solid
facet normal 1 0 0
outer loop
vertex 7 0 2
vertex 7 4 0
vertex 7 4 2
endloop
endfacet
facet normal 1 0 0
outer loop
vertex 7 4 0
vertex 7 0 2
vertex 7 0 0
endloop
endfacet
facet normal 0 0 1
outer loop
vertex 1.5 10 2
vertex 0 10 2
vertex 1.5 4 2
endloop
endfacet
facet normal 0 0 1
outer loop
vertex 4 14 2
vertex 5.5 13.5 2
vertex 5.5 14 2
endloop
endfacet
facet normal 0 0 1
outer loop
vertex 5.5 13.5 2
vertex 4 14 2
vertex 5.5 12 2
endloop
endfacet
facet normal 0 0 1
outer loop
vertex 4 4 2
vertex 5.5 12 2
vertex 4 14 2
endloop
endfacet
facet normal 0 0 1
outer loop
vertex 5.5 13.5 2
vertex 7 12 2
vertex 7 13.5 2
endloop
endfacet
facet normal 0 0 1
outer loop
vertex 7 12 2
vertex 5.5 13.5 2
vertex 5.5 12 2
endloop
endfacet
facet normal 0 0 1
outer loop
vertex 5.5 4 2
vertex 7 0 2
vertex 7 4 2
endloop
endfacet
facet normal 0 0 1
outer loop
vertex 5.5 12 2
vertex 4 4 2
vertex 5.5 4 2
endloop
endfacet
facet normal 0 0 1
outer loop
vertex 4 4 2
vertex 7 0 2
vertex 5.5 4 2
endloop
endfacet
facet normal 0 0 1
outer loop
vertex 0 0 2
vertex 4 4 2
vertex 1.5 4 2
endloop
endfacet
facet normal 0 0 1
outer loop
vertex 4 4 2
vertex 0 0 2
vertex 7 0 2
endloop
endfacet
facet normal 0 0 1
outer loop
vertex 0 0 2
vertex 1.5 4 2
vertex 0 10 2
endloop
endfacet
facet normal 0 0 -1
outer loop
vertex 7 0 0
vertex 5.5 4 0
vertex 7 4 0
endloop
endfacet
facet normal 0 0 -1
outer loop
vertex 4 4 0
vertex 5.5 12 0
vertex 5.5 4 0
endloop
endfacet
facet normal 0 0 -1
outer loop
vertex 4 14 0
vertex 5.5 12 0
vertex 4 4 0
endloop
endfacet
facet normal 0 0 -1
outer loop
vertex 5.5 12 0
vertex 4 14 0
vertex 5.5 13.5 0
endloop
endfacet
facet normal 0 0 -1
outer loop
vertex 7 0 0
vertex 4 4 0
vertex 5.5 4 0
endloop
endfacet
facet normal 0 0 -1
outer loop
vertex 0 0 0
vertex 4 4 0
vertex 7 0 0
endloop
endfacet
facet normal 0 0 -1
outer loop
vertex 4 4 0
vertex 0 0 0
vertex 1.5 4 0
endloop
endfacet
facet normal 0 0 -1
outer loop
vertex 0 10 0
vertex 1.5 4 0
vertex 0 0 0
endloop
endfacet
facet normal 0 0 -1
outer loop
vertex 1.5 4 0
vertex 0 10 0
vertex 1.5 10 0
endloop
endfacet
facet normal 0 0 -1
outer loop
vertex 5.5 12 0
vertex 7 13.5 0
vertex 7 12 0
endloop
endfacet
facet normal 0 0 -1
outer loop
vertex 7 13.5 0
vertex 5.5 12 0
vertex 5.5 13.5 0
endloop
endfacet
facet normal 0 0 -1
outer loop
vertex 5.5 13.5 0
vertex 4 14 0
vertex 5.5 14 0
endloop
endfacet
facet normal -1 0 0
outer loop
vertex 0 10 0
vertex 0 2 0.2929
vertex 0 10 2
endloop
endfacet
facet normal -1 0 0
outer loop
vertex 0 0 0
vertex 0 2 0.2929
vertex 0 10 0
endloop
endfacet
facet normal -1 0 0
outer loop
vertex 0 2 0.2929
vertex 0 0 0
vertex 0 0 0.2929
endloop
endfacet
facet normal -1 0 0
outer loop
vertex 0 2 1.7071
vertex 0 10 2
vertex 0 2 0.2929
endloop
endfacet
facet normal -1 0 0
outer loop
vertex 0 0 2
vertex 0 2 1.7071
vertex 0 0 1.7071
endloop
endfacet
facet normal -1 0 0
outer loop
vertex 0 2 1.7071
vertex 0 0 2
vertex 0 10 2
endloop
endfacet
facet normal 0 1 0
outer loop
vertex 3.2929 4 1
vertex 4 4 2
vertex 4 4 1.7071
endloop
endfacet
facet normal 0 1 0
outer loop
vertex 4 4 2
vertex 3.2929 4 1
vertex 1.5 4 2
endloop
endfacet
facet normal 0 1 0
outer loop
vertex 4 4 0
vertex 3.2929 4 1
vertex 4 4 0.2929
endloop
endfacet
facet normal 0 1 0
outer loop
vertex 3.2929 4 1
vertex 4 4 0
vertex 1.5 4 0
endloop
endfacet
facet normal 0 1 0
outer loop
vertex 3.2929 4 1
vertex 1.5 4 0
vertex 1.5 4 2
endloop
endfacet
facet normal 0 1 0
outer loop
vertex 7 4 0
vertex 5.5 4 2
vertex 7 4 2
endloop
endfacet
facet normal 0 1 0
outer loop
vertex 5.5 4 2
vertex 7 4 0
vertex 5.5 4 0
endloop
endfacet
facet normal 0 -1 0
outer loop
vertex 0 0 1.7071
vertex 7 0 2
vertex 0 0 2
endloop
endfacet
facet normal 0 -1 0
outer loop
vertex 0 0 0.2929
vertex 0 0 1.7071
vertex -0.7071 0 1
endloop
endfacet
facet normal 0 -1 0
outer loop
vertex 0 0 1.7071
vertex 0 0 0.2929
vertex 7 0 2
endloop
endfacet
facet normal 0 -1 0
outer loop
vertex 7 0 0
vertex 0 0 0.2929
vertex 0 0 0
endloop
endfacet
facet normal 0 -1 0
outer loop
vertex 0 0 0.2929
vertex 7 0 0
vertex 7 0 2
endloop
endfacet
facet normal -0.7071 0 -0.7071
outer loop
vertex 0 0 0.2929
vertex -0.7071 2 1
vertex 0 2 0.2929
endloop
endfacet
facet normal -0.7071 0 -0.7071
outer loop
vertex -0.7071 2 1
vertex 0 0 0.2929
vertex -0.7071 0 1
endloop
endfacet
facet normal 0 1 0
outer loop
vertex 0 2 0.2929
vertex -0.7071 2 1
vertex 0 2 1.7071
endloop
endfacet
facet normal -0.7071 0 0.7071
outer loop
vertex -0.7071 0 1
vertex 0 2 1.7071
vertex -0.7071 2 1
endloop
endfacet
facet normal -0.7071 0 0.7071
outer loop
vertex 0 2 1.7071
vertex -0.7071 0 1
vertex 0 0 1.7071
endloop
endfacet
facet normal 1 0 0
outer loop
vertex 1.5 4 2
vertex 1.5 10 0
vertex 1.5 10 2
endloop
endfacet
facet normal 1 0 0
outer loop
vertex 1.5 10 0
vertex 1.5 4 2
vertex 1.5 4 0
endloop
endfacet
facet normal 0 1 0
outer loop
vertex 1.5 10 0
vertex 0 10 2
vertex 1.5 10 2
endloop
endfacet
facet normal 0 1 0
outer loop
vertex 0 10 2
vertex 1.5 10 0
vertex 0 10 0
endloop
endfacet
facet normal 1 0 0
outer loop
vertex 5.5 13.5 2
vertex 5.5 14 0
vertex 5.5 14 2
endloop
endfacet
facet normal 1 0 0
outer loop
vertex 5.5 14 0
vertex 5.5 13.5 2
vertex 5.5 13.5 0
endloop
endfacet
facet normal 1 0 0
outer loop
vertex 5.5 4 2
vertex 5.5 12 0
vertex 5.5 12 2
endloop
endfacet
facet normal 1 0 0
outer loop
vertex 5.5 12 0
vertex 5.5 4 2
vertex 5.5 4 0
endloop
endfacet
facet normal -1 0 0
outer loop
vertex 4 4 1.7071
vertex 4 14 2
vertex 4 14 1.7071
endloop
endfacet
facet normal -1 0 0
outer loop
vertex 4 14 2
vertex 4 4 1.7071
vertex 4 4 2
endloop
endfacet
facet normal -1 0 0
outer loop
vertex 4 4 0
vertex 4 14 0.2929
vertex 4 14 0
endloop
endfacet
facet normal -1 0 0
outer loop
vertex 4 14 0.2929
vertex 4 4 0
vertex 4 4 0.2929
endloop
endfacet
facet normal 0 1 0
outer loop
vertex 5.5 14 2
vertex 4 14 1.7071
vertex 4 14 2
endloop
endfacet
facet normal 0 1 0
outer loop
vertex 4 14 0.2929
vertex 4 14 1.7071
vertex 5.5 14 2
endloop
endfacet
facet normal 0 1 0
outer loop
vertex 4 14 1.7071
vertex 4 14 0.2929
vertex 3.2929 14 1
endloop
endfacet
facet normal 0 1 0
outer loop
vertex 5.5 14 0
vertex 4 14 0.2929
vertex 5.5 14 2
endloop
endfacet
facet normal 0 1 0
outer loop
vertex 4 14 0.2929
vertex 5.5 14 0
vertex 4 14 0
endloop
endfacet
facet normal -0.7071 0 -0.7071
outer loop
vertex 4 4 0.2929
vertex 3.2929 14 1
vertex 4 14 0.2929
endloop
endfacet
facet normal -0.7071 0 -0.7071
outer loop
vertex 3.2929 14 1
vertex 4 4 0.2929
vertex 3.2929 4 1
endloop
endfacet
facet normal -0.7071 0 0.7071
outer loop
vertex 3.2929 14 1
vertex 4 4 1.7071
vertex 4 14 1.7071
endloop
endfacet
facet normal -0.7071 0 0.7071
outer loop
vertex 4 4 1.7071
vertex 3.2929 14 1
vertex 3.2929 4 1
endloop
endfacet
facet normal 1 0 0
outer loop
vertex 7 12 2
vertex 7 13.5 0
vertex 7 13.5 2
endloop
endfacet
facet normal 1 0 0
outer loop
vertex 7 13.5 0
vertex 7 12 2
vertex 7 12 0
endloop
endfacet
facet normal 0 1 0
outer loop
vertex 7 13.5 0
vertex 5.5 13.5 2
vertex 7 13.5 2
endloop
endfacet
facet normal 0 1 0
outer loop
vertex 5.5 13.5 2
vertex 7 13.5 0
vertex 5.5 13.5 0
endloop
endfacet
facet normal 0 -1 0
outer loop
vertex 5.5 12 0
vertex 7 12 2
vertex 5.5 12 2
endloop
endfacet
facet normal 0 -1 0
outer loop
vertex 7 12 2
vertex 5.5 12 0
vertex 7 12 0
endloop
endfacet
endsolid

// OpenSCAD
baseY=4;

pinHeight=2;

innerPinLen=6;
outerPinLen=10;
gapBetweenPins=2.5;

pinWidth=1.5;

switchFootWidth=1.5; // X
switchFootLen=1.5; // Y
switchFootYOffset=8; // from base

baseX= 2*pinWidth + gapBetweenPins+ switchFootWidth;

// base
cube([baseX,baseY, pinHeight]);

// base pointer
color("blue")translate([-sqrt(2*pow(pinHeight/4,2)),0,pinHeight/2]) rotate([0,45,0])  cube([pinHeight/2,baseY/2, pinHeight/2]);

// inner Pin
translate([0,baseY,0]) cube([pinWidth,innerPinLen, pinHeight]);

// outer Pin
translate([pinWidth+gapBetweenPins,baseY,0]) cube([pinWidth,outerPinLen, pinHeight]);

// outer Pin blade
color("blue")translate([-sqrt(2*pow(pinHeight/4,2)) +
pinWidth+gapBetweenPins,baseY,pinHeight/2]) rotate([0,45,0])  cube([pinHeight/2,outerPinLen, pinHeight/2]);

// switch Foot
translate([2*pinWidth+gapBetweenPins,switchFootYOffset+baseY,0]) cube([switchFootLen,switchFootLen, pinHeight]);
